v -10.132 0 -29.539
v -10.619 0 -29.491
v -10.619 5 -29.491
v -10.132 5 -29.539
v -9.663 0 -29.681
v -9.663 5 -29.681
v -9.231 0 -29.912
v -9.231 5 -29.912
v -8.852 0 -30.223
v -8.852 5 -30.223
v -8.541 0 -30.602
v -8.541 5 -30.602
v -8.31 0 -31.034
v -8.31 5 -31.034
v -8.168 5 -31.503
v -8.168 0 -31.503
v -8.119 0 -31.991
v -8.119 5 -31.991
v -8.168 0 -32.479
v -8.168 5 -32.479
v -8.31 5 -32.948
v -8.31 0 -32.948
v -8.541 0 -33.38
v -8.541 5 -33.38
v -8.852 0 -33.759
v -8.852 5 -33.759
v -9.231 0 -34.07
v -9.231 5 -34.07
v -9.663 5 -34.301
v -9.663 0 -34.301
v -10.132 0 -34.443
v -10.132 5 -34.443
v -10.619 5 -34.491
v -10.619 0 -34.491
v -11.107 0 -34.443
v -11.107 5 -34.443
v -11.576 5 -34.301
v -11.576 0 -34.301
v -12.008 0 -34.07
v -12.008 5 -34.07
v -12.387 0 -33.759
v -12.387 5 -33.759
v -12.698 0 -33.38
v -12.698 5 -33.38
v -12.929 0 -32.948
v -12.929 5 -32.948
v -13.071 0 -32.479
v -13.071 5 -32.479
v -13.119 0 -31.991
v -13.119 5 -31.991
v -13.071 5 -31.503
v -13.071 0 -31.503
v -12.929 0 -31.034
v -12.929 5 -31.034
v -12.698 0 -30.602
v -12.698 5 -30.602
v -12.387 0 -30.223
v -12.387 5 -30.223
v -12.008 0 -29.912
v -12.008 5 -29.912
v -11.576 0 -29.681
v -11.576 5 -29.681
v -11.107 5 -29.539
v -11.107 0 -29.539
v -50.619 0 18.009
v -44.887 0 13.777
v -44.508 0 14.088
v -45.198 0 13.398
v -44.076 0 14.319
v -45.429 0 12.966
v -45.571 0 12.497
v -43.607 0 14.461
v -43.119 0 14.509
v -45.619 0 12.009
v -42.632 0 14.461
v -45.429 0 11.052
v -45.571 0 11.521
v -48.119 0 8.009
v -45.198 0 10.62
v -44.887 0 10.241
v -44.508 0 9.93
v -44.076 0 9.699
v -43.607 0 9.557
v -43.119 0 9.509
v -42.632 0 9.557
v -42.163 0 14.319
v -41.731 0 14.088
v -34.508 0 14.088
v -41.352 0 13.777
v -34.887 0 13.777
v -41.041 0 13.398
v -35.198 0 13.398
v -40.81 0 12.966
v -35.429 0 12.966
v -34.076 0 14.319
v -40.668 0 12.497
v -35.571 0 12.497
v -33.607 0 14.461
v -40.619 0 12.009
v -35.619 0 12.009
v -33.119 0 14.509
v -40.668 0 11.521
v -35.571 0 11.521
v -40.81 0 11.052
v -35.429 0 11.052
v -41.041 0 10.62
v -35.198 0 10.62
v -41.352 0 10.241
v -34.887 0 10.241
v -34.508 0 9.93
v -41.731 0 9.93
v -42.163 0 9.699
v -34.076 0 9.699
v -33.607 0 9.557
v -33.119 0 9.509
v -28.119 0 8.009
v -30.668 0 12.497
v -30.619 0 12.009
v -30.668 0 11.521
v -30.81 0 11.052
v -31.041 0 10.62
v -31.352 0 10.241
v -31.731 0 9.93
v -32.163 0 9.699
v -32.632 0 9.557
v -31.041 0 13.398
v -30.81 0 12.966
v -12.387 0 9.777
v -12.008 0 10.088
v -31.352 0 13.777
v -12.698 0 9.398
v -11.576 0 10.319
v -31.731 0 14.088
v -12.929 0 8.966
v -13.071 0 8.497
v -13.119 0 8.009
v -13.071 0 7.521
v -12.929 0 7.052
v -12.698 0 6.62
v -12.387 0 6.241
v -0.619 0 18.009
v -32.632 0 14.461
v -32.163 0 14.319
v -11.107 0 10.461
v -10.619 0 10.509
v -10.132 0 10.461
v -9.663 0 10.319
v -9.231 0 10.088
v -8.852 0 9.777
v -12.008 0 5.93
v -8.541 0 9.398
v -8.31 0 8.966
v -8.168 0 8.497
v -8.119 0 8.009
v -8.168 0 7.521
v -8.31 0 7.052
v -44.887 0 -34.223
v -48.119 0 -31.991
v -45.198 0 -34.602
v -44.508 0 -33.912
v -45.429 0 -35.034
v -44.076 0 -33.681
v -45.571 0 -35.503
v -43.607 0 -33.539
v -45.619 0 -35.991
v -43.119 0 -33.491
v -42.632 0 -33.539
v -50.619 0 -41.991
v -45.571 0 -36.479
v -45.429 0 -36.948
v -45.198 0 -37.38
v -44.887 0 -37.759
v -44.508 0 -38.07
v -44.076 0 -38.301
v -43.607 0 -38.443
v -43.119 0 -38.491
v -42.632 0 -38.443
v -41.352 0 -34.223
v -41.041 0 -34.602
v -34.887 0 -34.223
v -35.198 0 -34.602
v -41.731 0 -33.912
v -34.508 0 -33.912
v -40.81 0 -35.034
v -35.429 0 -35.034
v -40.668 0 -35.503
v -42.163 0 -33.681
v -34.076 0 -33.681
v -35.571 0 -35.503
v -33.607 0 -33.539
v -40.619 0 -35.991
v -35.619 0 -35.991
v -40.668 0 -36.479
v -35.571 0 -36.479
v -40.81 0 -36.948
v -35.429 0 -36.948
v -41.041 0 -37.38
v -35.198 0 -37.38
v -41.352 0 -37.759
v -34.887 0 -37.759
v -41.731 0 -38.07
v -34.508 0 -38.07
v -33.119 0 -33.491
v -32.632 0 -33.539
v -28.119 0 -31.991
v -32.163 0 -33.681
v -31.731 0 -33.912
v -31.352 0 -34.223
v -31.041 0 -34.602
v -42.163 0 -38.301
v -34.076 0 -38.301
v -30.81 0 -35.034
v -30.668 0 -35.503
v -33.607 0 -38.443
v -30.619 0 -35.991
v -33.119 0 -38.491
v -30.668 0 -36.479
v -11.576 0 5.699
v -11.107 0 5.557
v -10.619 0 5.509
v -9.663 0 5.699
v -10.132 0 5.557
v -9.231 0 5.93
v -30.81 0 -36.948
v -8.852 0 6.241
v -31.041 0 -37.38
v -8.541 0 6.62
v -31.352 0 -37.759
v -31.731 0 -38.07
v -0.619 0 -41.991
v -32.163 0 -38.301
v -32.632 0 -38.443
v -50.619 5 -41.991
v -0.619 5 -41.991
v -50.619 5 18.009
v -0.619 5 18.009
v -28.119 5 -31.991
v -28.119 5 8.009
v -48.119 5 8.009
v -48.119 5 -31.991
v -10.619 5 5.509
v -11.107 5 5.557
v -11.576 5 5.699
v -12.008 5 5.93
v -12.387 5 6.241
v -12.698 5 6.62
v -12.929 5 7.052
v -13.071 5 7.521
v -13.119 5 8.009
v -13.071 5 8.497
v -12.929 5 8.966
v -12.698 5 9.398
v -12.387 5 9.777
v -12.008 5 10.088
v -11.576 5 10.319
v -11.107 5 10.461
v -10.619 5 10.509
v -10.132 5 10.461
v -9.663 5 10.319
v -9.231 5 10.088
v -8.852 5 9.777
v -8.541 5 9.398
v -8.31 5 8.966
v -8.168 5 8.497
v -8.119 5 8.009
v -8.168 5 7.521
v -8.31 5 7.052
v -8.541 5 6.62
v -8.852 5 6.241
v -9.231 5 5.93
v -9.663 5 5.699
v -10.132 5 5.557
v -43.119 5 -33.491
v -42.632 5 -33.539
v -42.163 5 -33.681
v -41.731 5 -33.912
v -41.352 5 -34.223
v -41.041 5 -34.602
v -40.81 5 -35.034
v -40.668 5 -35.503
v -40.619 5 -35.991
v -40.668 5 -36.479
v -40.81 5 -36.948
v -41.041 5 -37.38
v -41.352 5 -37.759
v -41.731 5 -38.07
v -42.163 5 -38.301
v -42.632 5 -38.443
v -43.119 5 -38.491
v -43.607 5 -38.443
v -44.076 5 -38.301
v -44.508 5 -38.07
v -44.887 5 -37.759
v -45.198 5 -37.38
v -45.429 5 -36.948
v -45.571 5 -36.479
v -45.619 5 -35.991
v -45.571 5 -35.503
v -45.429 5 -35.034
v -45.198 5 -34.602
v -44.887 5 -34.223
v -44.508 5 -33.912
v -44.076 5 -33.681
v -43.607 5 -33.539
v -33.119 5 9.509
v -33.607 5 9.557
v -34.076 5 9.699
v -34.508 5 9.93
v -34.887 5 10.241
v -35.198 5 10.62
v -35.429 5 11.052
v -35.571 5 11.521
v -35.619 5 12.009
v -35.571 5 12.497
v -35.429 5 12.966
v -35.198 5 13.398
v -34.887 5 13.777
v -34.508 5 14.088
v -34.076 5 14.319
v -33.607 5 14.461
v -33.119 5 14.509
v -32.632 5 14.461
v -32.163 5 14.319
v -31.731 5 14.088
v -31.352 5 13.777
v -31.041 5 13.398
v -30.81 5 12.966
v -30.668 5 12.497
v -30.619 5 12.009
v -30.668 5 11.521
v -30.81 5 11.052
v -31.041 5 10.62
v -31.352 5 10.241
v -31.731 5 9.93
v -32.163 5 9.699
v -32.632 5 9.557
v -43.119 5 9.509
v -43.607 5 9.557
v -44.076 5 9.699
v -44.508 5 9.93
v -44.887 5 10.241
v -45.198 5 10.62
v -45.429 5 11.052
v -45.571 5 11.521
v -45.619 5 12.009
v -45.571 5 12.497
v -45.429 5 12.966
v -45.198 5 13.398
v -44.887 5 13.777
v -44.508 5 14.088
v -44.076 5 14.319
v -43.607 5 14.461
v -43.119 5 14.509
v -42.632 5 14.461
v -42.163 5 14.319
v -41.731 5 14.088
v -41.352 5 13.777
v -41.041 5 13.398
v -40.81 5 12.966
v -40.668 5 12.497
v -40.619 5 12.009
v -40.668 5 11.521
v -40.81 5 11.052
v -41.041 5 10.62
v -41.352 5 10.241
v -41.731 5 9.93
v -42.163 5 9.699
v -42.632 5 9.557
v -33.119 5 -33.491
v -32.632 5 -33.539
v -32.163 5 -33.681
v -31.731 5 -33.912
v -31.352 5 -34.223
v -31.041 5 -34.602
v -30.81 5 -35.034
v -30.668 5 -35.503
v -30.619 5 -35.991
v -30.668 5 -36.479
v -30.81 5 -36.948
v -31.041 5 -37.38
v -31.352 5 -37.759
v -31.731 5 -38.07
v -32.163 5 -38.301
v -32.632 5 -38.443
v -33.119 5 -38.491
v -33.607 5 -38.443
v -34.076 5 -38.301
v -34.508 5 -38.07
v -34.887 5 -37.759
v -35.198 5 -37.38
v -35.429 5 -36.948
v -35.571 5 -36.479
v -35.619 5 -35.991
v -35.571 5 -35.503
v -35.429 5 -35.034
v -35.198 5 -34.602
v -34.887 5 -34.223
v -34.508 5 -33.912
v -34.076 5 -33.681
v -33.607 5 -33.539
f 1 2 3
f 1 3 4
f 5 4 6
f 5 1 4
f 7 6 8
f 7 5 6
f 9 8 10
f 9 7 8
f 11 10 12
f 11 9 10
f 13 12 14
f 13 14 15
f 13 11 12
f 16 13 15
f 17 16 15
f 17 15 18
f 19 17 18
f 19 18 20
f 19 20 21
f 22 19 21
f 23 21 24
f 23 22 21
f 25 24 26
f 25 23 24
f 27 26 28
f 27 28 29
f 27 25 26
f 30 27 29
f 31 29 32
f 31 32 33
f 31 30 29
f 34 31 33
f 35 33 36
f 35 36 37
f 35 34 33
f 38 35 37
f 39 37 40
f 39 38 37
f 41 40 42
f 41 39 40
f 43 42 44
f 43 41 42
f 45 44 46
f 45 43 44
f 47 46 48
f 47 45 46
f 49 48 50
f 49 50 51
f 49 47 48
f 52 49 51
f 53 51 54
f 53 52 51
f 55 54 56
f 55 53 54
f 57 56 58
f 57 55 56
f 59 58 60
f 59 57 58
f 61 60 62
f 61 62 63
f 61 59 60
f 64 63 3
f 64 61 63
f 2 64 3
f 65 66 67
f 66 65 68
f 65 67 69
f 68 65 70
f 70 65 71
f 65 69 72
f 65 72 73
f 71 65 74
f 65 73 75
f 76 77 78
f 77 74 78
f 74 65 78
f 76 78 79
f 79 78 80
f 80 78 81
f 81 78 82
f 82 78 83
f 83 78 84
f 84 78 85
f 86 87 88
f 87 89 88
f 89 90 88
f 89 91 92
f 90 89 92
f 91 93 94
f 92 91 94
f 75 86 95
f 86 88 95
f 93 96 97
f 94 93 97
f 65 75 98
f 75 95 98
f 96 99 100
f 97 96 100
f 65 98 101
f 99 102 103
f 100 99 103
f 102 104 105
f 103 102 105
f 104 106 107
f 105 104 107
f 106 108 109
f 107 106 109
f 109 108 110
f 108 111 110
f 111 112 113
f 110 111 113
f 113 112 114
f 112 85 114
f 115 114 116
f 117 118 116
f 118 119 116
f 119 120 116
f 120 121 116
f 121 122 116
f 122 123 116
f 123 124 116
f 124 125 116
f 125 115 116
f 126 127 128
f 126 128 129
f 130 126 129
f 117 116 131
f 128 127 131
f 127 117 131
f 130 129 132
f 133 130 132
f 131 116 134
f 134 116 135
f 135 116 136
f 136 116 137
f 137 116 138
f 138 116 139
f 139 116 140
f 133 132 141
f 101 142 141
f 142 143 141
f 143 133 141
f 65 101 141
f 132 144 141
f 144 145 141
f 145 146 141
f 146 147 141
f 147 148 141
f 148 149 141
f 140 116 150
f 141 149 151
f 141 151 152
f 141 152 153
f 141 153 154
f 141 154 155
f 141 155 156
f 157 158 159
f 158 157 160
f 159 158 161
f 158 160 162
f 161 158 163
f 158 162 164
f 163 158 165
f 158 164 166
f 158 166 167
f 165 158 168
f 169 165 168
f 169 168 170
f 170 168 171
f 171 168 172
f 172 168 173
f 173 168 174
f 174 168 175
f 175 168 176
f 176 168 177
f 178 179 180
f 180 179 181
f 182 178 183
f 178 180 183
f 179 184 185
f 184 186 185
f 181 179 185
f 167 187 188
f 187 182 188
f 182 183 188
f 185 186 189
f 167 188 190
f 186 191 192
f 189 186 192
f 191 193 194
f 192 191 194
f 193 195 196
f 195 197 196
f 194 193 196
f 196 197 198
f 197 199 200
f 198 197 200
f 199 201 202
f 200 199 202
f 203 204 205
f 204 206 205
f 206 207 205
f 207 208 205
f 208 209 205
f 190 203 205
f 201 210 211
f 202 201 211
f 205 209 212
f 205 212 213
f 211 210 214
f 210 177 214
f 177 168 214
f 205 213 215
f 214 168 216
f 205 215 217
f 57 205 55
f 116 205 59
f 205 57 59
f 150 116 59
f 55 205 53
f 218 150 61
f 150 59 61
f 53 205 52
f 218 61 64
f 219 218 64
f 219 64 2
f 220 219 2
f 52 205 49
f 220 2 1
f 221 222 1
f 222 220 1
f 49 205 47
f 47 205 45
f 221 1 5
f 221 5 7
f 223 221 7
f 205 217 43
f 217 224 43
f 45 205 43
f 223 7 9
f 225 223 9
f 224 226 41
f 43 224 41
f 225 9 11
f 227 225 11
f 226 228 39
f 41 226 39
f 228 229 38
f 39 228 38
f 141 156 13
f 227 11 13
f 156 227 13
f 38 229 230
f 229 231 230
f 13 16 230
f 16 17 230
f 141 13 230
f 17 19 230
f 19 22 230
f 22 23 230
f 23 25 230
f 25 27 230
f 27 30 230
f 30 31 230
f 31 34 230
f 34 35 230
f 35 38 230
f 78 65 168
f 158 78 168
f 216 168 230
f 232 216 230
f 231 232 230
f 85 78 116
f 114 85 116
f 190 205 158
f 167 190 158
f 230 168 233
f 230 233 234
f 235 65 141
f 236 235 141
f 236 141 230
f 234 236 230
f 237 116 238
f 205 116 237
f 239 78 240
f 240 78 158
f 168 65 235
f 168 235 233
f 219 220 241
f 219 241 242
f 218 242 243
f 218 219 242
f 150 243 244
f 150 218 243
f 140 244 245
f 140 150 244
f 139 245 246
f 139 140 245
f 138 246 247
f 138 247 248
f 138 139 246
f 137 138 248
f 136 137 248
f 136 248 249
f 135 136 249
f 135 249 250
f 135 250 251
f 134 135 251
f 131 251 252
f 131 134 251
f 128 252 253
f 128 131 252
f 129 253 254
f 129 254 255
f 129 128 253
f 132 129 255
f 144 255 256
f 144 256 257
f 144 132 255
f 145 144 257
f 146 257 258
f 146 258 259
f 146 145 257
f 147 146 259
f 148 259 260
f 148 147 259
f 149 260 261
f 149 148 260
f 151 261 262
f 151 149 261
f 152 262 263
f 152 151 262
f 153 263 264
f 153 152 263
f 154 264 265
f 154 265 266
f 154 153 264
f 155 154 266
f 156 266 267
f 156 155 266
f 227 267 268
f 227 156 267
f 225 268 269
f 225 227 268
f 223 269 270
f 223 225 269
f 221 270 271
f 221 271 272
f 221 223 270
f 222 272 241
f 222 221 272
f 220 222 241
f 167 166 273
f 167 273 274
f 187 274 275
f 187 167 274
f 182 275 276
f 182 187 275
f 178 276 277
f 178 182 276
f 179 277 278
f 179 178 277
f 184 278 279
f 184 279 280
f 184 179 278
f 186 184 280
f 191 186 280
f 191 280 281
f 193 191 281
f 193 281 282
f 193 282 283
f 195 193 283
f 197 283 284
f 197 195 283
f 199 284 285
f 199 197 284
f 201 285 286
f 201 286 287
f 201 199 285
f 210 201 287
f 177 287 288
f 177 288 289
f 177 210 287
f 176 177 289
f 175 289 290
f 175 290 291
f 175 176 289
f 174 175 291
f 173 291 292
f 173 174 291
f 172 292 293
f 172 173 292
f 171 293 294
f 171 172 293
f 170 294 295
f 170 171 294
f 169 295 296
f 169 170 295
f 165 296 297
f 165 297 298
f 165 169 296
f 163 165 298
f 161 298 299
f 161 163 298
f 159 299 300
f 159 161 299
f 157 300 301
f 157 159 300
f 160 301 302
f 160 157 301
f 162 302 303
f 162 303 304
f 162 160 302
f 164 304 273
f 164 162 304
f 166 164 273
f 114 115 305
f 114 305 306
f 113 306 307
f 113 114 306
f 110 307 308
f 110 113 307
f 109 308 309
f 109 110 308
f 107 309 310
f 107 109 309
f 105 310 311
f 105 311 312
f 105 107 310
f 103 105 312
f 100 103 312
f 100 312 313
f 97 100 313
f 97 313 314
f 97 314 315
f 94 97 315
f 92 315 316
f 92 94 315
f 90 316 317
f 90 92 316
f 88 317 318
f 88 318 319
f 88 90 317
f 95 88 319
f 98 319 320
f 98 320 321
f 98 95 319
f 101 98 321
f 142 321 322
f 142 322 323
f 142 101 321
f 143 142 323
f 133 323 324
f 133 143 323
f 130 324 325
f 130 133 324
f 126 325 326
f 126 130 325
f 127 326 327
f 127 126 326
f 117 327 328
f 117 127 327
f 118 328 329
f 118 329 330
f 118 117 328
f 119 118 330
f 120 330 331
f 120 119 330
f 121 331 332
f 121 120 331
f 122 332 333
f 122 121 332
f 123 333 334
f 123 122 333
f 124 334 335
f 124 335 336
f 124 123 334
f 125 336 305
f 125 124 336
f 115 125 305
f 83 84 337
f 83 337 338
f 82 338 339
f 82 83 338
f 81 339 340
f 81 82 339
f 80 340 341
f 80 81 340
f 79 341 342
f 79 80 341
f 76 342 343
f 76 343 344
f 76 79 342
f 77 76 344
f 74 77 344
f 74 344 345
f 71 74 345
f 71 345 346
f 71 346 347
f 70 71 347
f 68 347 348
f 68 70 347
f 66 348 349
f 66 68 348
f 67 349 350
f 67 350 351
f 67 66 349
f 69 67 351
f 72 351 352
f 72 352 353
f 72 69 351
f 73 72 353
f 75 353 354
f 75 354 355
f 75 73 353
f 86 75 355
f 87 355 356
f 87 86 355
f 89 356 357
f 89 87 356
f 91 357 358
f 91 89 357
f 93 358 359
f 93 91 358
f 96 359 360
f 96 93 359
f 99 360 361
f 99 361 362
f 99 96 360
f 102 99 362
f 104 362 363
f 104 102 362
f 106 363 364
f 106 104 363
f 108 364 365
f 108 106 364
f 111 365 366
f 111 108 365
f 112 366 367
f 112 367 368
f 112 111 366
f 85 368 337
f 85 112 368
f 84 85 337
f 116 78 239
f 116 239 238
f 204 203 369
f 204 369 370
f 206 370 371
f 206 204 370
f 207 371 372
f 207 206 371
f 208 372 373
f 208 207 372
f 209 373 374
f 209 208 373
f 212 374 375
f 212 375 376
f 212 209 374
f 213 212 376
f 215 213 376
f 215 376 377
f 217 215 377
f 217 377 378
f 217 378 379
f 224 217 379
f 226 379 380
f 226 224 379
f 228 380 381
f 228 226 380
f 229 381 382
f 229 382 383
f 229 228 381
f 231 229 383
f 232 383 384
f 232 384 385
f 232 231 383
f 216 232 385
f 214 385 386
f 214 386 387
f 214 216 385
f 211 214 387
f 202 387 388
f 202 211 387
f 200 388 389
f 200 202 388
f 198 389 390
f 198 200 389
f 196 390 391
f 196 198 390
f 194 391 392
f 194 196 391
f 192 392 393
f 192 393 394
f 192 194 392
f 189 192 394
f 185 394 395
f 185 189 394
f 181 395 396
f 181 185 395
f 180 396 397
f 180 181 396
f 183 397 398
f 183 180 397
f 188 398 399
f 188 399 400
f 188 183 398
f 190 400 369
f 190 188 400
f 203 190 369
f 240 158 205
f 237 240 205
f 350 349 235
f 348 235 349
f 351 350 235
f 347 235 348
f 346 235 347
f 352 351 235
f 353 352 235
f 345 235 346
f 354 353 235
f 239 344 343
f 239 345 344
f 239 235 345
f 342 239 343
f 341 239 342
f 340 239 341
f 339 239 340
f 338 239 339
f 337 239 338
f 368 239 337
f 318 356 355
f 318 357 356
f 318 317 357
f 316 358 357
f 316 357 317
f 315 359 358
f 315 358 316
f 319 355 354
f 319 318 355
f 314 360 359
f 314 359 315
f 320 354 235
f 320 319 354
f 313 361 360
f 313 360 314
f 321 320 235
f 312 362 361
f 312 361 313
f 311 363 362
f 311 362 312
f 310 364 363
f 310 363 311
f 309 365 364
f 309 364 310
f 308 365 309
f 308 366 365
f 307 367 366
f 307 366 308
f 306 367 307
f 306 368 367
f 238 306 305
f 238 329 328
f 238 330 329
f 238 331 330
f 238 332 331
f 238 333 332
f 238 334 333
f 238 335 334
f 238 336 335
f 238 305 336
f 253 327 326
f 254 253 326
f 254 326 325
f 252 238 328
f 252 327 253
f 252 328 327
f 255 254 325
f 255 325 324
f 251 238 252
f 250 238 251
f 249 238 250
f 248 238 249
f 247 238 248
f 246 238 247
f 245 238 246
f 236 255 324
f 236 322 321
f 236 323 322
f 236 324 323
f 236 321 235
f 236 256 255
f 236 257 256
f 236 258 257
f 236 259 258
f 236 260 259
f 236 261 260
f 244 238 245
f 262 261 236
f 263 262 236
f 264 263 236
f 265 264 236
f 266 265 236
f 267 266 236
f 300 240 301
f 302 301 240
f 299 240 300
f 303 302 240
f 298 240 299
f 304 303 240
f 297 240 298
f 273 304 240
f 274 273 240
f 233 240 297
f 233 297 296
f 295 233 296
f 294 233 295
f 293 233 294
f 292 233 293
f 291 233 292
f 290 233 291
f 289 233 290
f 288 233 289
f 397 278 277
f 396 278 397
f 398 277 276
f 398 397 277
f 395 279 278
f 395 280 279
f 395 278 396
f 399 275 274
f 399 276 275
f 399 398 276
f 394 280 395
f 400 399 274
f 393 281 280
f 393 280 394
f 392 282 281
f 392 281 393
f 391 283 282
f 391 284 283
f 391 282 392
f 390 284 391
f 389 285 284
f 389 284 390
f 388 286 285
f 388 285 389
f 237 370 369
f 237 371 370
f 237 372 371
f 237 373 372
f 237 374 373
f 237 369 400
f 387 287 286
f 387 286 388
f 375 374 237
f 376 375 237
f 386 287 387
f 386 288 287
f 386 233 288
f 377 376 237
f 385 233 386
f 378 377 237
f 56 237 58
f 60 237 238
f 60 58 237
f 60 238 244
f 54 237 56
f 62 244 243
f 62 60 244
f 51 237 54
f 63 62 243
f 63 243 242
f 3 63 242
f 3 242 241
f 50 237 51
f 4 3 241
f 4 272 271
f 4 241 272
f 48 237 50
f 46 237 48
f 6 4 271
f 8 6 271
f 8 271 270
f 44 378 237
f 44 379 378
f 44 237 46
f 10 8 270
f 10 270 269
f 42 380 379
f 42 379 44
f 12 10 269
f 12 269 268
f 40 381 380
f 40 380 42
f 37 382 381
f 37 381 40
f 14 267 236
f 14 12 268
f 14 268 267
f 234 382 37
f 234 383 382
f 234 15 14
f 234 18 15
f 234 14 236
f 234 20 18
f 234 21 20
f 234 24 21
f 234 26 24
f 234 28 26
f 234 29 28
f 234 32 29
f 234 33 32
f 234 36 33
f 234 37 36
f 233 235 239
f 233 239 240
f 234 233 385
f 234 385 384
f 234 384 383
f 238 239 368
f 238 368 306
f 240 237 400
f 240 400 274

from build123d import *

# Parameters (mm, degrees)
SKETCH1_W           = 50
SKETCH1_H           = 60
SKETCH1_R           = 2.5
SKETCH1_W_2         = 20
SKETCH1_H_2         = 40
BOSS_EXTRUDE1_DEPTH = 5


with BuildPart() as part:
    # Sketch1 → Boss-Extrude1 (new body)
    with BuildSketch(Plane(origin=(0, 0, 0), x_dir=(1, 0, 0), z_dir=(0, 1, 0))):
        with Locations((-25.619469027, 11.991150442)):
            Rectangle(SKETCH1_W, SKETCH1_H)
        with Locations(Location((-10.619469027, 31.991150442, 0), (0, 0, 270))):
            Circle(SKETCH1_R, mode=Mode.SUBTRACT)
        with Locations(Location((-10.619469027, -8.008849558, 0), (0, 0, 90))):
            Circle(SKETCH1_R, mode=Mode.SUBTRACT)
        with Locations(Location((-43.119469027, 35.991150442, 0), (0, 0, 270))):
            Circle(SKETCH1_R, mode=Mode.SUBTRACT)
        with Locations(Location((-33.119469027, 35.991150442, 0), (0, 0, 270))):
            Circle(SKETCH1_R, mode=Mode.SUBTRACT)
        with Locations(Location((-43.119469027, -12.008849558, 0), (0, 0, 90))):
            Circle(SKETCH1_R, mode=Mode.SUBTRACT)
        with Locations(Location((-33.119469027, -12.008849558, 0), (0, 0, 90))):
            Circle(SKETCH1_R, mode=Mode.SUBTRACT)
        with Locations((-38.119469027, 11.991150442)):
            Rectangle(SKETCH1_W_2, SKETCH1_H_2, mode=Mode.SUBTRACT)
    extrude(amount=BOSS_EXTRUDE1_DEPTH)


solid = part.part
